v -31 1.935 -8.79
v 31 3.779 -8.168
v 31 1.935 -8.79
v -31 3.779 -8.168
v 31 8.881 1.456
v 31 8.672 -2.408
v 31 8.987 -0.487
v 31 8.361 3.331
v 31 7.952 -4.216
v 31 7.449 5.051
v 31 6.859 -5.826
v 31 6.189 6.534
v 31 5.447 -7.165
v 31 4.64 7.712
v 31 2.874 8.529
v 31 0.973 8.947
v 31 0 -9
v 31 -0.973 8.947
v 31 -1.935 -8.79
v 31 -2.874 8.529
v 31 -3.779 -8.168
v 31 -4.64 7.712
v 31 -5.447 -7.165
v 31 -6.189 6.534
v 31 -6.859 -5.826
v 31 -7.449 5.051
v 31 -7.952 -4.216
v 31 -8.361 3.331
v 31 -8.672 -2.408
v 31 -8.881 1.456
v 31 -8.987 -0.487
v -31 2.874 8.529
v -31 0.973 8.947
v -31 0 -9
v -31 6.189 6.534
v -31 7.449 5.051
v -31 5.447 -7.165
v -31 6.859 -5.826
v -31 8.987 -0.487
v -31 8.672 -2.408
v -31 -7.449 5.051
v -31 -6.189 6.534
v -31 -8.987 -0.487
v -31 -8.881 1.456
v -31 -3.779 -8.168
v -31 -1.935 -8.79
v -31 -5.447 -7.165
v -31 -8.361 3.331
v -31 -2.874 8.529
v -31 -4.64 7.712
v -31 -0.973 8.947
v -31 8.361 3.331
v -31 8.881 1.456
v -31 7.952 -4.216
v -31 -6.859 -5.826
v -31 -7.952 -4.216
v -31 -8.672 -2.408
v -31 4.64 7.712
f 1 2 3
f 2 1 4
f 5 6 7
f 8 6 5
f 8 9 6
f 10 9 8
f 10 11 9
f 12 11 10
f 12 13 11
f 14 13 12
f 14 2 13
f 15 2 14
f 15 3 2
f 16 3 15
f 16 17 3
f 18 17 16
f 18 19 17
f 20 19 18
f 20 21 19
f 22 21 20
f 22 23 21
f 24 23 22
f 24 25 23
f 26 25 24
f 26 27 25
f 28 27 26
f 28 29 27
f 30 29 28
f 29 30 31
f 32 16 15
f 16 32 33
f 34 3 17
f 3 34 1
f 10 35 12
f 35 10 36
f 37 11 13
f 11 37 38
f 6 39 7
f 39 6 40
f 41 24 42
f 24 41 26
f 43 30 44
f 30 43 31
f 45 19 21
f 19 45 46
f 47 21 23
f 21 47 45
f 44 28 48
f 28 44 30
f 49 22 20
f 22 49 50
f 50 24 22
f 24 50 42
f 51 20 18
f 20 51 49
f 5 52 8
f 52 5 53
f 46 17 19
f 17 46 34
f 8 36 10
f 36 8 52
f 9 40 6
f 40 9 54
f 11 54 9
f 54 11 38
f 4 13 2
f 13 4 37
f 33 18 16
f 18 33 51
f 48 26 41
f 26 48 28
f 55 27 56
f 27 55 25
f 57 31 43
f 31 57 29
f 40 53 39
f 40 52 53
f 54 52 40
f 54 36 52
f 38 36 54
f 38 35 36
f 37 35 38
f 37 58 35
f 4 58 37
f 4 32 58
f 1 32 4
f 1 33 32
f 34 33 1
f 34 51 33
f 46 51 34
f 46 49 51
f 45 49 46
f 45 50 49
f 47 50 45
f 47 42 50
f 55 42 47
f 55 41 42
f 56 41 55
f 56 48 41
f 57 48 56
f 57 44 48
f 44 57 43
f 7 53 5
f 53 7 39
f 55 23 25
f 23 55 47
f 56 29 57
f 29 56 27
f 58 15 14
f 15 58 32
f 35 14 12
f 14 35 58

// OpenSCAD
module akkum16850(){
    rotate([0,90,0])
    difference(){
        color("orange")
        cylinder(d = 18,h = 62,center = true);
        
        translate([0,0,31])
        color("gray")
        circle(d = 16);
        
        translate([0,0,-30.5])
        color("lightgray")
        circle(d = 16);
        
    }
    rotate([0,90,0])
    translate([0,0,30.6])
    color("lightgray")
    circle(d = 13);
    rotate([0,90,0])
    translate([0,0,31.3])
    color("white")
    circle(d = 5);
    
    rotate([0,90,0])
    translate([0,0,-30.4])
    color("lightgray")
    circle(d = 15);
}
akkum16850();
